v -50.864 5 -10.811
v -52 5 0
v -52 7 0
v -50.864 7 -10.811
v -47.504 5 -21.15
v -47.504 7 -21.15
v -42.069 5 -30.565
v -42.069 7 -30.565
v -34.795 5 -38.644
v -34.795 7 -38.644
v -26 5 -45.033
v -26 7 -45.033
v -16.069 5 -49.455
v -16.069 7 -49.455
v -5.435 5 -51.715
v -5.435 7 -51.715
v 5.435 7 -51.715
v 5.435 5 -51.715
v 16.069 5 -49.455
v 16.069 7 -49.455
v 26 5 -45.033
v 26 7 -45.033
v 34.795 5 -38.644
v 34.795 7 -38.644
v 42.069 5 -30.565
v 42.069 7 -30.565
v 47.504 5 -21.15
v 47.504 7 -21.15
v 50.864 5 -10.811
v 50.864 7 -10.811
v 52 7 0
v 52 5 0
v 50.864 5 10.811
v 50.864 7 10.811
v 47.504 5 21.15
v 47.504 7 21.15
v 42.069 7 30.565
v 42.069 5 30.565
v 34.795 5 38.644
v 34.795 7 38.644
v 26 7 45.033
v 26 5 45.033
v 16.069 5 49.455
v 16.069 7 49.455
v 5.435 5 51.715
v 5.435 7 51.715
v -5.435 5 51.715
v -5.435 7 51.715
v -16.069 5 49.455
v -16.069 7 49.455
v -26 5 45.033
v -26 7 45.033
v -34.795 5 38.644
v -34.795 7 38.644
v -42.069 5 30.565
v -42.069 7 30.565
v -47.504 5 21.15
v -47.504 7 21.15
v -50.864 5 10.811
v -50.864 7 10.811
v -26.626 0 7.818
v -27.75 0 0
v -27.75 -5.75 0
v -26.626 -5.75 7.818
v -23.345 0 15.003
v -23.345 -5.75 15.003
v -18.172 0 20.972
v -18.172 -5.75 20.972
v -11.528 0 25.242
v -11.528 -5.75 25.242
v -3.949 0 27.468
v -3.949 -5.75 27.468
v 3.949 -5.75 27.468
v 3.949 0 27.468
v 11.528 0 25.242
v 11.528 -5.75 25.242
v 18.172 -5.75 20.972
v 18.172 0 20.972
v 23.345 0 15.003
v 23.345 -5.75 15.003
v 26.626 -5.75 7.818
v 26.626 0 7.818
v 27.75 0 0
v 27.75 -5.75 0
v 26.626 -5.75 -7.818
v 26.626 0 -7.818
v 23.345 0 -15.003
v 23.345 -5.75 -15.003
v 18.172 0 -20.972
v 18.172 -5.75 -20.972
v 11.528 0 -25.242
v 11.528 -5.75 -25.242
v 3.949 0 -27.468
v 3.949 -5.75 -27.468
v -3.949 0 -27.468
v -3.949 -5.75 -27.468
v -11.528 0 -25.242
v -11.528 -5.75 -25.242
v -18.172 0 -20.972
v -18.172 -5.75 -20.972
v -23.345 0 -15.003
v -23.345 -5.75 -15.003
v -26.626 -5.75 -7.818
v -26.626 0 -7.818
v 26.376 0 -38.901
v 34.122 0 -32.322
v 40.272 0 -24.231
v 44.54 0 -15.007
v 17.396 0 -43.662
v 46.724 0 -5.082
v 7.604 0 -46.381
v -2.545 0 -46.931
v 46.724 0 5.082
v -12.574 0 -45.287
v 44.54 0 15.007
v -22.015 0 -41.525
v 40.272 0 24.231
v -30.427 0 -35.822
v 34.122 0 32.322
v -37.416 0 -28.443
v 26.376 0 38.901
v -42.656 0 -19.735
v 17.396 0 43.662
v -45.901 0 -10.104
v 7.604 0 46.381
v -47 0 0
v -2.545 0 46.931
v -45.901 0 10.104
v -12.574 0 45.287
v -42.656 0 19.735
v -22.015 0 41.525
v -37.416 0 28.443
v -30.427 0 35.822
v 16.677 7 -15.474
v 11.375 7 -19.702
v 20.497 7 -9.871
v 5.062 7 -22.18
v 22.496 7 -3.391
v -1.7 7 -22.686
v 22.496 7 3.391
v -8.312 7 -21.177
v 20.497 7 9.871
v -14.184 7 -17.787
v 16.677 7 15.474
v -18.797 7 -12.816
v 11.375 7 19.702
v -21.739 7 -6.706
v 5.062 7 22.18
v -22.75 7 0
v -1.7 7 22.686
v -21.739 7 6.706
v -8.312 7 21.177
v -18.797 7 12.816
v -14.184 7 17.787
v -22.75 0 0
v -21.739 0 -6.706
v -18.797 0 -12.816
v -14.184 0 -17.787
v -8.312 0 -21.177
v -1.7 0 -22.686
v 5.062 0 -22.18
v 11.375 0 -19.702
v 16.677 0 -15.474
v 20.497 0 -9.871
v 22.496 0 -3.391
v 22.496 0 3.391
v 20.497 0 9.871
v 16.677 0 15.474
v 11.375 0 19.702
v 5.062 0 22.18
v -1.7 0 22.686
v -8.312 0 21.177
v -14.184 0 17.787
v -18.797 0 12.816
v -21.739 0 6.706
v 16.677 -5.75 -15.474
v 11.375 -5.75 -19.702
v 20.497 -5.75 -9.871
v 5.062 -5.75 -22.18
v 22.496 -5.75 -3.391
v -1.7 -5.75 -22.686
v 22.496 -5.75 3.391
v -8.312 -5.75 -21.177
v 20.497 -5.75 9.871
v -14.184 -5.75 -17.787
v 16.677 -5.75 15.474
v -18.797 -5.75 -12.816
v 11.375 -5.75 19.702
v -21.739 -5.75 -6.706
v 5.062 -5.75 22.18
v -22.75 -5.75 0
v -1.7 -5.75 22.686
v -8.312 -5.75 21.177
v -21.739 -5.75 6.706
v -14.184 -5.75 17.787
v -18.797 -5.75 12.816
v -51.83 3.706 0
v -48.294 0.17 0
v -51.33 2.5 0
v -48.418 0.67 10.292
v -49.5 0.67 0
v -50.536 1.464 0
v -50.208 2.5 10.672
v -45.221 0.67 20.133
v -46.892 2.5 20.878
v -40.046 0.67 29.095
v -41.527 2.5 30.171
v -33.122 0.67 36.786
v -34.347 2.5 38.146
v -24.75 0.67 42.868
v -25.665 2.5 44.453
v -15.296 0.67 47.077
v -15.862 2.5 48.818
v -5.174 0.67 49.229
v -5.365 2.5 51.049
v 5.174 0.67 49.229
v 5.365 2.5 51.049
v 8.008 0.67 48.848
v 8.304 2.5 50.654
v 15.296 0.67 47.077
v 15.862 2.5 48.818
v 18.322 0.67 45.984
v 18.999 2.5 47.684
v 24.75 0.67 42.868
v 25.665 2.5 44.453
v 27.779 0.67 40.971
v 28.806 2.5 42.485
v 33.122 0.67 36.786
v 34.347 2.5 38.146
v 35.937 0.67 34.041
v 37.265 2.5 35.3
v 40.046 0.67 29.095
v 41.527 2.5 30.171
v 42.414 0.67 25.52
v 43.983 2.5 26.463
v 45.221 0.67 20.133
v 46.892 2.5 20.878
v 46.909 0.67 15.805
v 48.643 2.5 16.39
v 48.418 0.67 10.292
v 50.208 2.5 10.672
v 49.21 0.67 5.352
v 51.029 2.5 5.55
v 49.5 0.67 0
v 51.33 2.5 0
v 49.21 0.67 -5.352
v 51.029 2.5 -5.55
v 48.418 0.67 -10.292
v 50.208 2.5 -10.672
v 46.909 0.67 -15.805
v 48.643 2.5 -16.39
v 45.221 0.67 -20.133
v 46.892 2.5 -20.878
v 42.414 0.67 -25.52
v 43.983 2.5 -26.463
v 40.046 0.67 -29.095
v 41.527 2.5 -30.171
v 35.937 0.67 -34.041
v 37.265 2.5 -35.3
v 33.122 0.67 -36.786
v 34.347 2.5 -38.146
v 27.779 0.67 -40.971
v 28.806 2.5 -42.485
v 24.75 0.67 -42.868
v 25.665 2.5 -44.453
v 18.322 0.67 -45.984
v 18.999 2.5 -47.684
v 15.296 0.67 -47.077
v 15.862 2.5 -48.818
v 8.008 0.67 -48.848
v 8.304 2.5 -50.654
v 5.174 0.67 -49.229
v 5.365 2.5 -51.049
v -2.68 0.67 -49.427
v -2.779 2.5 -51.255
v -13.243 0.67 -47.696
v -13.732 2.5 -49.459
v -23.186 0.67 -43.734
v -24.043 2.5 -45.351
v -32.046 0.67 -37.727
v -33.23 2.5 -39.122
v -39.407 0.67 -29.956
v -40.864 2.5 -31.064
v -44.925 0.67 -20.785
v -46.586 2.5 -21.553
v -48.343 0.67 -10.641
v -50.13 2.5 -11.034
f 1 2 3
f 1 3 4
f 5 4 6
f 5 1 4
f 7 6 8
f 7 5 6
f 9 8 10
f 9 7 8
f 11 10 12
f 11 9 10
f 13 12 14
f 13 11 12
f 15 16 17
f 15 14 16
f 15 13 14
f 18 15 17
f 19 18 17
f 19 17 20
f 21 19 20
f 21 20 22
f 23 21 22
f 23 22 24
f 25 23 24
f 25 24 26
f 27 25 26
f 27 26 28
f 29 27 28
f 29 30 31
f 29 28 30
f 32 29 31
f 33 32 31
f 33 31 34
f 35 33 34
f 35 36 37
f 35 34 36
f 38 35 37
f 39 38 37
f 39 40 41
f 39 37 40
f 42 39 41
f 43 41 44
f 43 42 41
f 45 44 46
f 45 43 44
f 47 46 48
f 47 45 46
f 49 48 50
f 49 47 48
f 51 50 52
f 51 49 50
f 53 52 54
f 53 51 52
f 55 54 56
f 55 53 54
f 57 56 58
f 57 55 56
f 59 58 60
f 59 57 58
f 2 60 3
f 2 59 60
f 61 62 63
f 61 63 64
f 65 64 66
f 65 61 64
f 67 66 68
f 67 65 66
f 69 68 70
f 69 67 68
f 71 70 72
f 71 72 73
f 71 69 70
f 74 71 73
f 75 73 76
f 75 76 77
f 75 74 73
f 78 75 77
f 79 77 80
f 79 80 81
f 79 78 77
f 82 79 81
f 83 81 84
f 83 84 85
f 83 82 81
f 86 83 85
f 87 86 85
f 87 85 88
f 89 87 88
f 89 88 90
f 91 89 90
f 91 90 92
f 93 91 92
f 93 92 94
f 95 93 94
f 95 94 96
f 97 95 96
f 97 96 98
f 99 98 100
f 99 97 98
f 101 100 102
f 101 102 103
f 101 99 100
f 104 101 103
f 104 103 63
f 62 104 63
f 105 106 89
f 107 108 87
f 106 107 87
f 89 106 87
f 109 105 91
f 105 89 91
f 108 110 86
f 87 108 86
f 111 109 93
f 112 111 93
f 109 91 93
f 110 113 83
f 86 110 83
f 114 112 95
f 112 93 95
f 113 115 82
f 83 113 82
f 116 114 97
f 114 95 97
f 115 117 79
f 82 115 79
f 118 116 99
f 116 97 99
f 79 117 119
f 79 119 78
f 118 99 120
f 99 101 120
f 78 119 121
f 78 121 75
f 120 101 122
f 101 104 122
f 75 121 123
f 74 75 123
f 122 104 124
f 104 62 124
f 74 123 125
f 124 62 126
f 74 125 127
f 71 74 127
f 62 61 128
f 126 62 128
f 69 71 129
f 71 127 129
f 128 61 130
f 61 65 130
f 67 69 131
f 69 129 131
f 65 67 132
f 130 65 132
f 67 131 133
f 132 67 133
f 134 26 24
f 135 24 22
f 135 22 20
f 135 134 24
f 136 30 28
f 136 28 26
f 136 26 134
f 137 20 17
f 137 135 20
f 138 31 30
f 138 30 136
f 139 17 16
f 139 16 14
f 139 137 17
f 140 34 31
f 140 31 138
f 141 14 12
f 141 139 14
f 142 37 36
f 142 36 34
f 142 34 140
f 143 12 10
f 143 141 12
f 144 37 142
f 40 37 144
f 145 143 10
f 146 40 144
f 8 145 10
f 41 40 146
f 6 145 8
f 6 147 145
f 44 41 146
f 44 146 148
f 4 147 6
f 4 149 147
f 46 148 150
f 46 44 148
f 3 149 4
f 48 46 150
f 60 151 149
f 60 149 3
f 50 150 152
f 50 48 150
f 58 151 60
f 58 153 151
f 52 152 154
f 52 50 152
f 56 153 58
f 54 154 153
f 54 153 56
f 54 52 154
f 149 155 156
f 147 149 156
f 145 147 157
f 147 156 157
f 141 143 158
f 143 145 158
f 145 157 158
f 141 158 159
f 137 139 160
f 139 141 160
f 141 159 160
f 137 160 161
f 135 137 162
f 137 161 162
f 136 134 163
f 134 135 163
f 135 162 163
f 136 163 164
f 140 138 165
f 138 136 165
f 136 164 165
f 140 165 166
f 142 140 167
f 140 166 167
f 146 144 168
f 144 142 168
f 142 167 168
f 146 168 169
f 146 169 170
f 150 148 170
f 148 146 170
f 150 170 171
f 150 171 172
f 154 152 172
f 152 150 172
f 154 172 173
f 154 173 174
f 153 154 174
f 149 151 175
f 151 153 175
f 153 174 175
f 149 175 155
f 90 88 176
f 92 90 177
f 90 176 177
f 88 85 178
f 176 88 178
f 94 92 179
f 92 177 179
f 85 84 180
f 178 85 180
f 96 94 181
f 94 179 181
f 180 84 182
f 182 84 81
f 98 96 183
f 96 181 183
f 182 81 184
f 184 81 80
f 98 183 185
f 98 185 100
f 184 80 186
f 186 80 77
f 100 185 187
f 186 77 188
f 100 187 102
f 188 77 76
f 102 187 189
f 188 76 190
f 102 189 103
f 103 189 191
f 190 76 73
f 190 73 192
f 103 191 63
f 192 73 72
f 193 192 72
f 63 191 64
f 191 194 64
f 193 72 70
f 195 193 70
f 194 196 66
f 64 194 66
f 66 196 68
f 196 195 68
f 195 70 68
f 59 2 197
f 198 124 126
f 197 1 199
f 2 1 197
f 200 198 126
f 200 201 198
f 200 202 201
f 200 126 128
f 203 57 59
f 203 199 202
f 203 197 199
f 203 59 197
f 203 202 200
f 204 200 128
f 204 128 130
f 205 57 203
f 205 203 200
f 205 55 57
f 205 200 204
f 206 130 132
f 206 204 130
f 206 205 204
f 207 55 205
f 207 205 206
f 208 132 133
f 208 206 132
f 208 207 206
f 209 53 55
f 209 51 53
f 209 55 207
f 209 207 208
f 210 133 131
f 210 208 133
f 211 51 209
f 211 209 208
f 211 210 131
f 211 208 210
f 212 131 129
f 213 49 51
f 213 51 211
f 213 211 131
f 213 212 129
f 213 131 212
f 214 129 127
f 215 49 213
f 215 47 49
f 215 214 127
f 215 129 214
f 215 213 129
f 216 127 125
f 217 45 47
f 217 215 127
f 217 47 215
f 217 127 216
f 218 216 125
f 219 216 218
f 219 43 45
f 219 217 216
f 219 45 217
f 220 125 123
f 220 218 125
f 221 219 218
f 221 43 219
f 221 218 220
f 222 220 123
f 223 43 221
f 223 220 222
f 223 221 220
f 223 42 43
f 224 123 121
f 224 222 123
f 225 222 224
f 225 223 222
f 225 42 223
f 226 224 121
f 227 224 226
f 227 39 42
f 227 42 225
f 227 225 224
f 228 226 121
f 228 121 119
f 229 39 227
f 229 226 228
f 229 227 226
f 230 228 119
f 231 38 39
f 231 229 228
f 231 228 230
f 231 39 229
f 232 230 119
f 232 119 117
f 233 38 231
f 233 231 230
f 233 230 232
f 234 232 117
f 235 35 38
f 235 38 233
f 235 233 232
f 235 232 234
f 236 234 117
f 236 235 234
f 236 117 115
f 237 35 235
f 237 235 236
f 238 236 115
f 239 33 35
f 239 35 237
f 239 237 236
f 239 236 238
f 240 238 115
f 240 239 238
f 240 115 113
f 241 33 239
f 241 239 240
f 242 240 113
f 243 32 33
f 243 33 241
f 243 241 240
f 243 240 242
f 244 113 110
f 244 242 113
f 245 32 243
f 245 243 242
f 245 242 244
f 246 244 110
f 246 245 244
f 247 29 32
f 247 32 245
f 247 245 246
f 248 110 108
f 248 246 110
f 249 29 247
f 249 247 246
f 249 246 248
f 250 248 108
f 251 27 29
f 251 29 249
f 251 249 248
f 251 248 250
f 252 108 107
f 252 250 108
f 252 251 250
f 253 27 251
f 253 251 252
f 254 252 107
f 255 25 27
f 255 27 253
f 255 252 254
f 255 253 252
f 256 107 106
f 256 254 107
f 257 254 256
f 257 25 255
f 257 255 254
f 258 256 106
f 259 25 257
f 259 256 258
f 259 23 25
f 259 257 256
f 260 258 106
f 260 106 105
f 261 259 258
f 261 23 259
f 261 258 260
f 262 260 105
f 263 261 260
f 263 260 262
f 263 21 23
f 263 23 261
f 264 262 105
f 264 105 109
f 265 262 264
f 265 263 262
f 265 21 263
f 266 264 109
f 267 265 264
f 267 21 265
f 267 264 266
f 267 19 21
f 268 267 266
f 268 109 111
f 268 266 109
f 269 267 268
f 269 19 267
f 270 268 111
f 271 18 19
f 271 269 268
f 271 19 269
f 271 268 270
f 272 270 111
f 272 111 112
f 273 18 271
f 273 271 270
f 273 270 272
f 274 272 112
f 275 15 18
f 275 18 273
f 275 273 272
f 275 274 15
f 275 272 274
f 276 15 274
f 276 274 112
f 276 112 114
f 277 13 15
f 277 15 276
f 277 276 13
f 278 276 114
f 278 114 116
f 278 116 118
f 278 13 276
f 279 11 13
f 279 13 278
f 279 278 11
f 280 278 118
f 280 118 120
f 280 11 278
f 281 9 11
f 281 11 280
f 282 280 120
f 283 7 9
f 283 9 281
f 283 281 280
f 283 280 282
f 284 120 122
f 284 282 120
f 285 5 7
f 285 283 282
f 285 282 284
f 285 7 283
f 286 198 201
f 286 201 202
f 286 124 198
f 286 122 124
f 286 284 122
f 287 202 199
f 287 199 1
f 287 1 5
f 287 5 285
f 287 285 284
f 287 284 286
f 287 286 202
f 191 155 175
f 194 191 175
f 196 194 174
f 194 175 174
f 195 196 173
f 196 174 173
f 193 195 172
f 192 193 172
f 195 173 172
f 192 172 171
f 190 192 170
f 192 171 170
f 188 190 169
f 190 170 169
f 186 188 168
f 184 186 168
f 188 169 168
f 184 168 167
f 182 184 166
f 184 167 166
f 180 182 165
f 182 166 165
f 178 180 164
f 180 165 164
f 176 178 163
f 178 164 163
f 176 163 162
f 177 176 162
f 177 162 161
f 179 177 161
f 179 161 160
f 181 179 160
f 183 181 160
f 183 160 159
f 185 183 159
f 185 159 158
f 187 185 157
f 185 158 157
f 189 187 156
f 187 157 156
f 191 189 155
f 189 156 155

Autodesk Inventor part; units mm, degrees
ref_plane "YZ Plane" through (0, 0, 0) normal (1, 0, 0) x (0, 1, 0)
ref_plane "XZ Plane" through (0, 0, 0) normal (0, 1, 0) x (-1, 0, 0)
ref_plane "XY Plane" through (0, 0, 0) normal (0, 0, 1) x (1, 0, 0)
sketch "Sketch1" plane through (0, 0, 0) normal (0, 1, 0) x (-1, 0, 0)
  circle A0 centre (0, 0) radius 22.75
  circle A1 centre (0, 0) radius 52
  circle A2 centre (0, 0) radius 27.75
  dimension "d0" = 45.5
  dimension "d1" = 104
  dimension "d2" = 55.5
extrude "Extrusion1" add sketch "Sketch1" along normal blind 7 contours A1 | A2
extrude "Extrusion2" add sketch "Sketch1" against normal blind 5.75 contours A2
fillet "Fillet1" radius 5 1 edges at (52, 0, 0)
properties part number "motor_chain_guide_outer"
